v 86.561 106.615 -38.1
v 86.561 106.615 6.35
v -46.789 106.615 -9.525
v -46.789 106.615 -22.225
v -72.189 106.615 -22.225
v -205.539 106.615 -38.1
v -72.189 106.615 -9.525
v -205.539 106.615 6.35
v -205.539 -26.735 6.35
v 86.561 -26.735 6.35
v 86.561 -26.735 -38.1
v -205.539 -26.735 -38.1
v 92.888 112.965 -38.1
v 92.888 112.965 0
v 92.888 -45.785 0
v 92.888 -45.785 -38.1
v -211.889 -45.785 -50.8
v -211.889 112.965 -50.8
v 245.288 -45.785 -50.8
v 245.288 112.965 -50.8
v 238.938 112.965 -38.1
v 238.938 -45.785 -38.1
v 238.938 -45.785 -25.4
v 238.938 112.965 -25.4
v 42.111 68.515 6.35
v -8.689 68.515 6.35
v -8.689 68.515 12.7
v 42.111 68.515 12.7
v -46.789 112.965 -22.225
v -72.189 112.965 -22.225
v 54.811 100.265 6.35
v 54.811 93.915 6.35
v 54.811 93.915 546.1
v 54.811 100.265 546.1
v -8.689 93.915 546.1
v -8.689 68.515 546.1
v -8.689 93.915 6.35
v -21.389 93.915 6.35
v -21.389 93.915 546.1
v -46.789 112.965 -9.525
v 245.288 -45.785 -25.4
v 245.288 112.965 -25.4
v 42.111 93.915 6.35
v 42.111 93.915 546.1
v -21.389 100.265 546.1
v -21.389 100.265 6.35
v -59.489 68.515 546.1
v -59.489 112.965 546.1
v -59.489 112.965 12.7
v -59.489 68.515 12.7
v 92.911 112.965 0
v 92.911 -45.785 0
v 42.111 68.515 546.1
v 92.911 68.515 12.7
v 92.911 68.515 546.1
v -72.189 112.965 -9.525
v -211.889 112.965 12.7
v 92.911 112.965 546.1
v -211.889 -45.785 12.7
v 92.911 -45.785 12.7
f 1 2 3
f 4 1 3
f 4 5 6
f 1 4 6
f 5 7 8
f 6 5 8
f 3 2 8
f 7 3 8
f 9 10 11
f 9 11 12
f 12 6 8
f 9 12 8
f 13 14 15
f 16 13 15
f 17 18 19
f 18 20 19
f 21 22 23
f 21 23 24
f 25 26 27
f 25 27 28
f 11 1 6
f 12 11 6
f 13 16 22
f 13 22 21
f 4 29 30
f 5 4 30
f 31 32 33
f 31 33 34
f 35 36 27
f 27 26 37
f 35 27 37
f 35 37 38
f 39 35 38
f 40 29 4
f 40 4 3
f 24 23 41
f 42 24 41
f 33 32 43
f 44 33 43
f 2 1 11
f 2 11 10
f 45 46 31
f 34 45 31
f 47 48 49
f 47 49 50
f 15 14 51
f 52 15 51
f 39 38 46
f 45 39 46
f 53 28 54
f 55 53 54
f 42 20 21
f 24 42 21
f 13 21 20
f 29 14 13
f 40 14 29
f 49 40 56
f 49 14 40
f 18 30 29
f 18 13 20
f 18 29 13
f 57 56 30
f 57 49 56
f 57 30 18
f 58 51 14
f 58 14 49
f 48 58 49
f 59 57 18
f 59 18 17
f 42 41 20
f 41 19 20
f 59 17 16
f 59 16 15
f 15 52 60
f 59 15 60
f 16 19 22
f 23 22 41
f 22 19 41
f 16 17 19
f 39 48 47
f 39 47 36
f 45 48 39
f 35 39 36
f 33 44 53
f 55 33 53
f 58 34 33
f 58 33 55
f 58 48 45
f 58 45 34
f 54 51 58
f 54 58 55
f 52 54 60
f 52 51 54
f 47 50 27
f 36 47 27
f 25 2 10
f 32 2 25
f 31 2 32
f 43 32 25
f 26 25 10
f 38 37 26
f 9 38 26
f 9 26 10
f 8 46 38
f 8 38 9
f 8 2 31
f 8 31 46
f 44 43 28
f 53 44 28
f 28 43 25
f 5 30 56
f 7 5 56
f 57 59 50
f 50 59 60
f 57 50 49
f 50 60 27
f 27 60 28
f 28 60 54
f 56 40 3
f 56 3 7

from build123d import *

# Parameters (mm, degrees)
F0_W      = 38.1
F0_H      = 6.35
F1_DEPTH  = 546.1
F3_DEPTH  = 12.7
F4_W      = 152.376732
F4_H      = 158.75
F5_DEPTH  = 50.8
F6_W      = 158.75
F6_H      = 12.7
F7_DEPTH  = 152.4
F8_W      = 6.35
F8_H      = 158.75
F9_DEPTH  = 12.7
F11_DEPTH = 152.4
F12_W     = 292.1
F12_H     = 44.45
F13_DEPTH = 139.7
F14_W     = 292.1
F14_H     = 44.45
F14_W_2   = 25.4
F14_H_2   = 12.7
F15_DEPTH = 6.35


with BuildPart() as f1:
    # F0 (on Top) → F1 (new body)
    with BuildSketch(Plane.XY):
        Polygon((-59.489019, 112.964728), (-59.489019, 100.264728), (-21.389019, 100.264728), (54.810981, 100.264728), (92.910981, 100.264728), (92.910981, 112.964728), align=None)
        with Locations((73.860981, 97.089728)):
            Rectangle(F0_W, F0_H)
        Polygon((92.910981, 93.914728), (54.810981, 93.914728), (42.110981, 93.914728), (42.110981, 68.514728), (92.910981, 68.514728), align=None)
        with Locations((-40.439019, 97.089728)):
            Rectangle(F0_W, F0_H)
        Polygon((-59.489019, 93.914728), (-59.489019, 68.514728), (-8.689019, 68.514728), (-8.689019, 93.914728), (-21.389019, 93.914728), align=None)
    extrude(amount=F1_DEPTH)

    # F2 (on face) → F3 (join)
    with BuildSketch(Plane(origin=(0, 0, 0), x_dir=(1, 0, 0), z_dir=(0, 0, -1))):
        Polygon((-59.489019, 45.785272), (-59.489019, -68.514728), (-8.689019, -68.514728), (42.110981, -68.514728), (92.910981, -68.514728), (92.910981, 45.785272), align=None)
    extrude(amount=-F3_DEPTH)

    # F4 (on face) → F5 (join)
    with BuildSketch(Plane(origin=(0, 0, 0), x_dir=(1, 0, 0), z_dir=(0, 0, -1))):
        with Locations((16.699347, -33.589728)):
            Rectangle(F4_W, F4_H)
    extrude(amount=F5_DEPTH)

    # F6 (on face) → F7 (join)
    with BuildSketch(Plane.YZ.offset(92.887713)):
        with Locations((33.589728, -44.45)):
            Rectangle(F6_W, F6_H)
    extrude(amount=F7_DEPTH)

    # F8 (on face) → F9 (join)
    with BuildSketch(Plane.XY.offset(-38.1)):
        with Locations((242.112713, 33.589728)):
            Rectangle(F8_W, F8_H)
    extrude(amount=F9_DEPTH)

    # F10 (on face) → F11 (join)
    with BuildSketch(Plane(origin=(-59.489019, 0, 0), x_dir=(0, -1, 0), z_dir=(-1, 0, 0))):
        Polygon((-112.964728, 12.7), (-112.964728, -50.8), (45.785272, -50.8), (45.785272, 12.7), (-68.514728, 12.7), align=None)
    extrude(amount=F11_DEPTH)

    # F12 (on face) → F13 (cut)
    with BuildSketch(Plane(origin=(0, 112.964728, 0), x_dir=(-1, 0, 0), z_dir=(0, 1, 0))):
        with Locations((59.489019, -15.875)):
            Rectangle(F12_W, F12_H)
    extrude(amount=-F13_DEPTH, mode=Mode.SUBTRACT)

    # F14 (on face) → F15 (join)
    with BuildSketch(Plane(origin=(0, 112.964728, 0), x_dir=(-1, 0, 0), z_dir=(0, 1, 0))):
        with Locations((59.489019, -15.875)):
            Rectangle(F14_W, F14_H)
        with Locations((59.489019, -15.875)):
            Rectangle(F14_W_2, F14_H_2, mode=Mode.SUBTRACT)
    extrude(amount=-F15_DEPTH)


solid = f1.part
